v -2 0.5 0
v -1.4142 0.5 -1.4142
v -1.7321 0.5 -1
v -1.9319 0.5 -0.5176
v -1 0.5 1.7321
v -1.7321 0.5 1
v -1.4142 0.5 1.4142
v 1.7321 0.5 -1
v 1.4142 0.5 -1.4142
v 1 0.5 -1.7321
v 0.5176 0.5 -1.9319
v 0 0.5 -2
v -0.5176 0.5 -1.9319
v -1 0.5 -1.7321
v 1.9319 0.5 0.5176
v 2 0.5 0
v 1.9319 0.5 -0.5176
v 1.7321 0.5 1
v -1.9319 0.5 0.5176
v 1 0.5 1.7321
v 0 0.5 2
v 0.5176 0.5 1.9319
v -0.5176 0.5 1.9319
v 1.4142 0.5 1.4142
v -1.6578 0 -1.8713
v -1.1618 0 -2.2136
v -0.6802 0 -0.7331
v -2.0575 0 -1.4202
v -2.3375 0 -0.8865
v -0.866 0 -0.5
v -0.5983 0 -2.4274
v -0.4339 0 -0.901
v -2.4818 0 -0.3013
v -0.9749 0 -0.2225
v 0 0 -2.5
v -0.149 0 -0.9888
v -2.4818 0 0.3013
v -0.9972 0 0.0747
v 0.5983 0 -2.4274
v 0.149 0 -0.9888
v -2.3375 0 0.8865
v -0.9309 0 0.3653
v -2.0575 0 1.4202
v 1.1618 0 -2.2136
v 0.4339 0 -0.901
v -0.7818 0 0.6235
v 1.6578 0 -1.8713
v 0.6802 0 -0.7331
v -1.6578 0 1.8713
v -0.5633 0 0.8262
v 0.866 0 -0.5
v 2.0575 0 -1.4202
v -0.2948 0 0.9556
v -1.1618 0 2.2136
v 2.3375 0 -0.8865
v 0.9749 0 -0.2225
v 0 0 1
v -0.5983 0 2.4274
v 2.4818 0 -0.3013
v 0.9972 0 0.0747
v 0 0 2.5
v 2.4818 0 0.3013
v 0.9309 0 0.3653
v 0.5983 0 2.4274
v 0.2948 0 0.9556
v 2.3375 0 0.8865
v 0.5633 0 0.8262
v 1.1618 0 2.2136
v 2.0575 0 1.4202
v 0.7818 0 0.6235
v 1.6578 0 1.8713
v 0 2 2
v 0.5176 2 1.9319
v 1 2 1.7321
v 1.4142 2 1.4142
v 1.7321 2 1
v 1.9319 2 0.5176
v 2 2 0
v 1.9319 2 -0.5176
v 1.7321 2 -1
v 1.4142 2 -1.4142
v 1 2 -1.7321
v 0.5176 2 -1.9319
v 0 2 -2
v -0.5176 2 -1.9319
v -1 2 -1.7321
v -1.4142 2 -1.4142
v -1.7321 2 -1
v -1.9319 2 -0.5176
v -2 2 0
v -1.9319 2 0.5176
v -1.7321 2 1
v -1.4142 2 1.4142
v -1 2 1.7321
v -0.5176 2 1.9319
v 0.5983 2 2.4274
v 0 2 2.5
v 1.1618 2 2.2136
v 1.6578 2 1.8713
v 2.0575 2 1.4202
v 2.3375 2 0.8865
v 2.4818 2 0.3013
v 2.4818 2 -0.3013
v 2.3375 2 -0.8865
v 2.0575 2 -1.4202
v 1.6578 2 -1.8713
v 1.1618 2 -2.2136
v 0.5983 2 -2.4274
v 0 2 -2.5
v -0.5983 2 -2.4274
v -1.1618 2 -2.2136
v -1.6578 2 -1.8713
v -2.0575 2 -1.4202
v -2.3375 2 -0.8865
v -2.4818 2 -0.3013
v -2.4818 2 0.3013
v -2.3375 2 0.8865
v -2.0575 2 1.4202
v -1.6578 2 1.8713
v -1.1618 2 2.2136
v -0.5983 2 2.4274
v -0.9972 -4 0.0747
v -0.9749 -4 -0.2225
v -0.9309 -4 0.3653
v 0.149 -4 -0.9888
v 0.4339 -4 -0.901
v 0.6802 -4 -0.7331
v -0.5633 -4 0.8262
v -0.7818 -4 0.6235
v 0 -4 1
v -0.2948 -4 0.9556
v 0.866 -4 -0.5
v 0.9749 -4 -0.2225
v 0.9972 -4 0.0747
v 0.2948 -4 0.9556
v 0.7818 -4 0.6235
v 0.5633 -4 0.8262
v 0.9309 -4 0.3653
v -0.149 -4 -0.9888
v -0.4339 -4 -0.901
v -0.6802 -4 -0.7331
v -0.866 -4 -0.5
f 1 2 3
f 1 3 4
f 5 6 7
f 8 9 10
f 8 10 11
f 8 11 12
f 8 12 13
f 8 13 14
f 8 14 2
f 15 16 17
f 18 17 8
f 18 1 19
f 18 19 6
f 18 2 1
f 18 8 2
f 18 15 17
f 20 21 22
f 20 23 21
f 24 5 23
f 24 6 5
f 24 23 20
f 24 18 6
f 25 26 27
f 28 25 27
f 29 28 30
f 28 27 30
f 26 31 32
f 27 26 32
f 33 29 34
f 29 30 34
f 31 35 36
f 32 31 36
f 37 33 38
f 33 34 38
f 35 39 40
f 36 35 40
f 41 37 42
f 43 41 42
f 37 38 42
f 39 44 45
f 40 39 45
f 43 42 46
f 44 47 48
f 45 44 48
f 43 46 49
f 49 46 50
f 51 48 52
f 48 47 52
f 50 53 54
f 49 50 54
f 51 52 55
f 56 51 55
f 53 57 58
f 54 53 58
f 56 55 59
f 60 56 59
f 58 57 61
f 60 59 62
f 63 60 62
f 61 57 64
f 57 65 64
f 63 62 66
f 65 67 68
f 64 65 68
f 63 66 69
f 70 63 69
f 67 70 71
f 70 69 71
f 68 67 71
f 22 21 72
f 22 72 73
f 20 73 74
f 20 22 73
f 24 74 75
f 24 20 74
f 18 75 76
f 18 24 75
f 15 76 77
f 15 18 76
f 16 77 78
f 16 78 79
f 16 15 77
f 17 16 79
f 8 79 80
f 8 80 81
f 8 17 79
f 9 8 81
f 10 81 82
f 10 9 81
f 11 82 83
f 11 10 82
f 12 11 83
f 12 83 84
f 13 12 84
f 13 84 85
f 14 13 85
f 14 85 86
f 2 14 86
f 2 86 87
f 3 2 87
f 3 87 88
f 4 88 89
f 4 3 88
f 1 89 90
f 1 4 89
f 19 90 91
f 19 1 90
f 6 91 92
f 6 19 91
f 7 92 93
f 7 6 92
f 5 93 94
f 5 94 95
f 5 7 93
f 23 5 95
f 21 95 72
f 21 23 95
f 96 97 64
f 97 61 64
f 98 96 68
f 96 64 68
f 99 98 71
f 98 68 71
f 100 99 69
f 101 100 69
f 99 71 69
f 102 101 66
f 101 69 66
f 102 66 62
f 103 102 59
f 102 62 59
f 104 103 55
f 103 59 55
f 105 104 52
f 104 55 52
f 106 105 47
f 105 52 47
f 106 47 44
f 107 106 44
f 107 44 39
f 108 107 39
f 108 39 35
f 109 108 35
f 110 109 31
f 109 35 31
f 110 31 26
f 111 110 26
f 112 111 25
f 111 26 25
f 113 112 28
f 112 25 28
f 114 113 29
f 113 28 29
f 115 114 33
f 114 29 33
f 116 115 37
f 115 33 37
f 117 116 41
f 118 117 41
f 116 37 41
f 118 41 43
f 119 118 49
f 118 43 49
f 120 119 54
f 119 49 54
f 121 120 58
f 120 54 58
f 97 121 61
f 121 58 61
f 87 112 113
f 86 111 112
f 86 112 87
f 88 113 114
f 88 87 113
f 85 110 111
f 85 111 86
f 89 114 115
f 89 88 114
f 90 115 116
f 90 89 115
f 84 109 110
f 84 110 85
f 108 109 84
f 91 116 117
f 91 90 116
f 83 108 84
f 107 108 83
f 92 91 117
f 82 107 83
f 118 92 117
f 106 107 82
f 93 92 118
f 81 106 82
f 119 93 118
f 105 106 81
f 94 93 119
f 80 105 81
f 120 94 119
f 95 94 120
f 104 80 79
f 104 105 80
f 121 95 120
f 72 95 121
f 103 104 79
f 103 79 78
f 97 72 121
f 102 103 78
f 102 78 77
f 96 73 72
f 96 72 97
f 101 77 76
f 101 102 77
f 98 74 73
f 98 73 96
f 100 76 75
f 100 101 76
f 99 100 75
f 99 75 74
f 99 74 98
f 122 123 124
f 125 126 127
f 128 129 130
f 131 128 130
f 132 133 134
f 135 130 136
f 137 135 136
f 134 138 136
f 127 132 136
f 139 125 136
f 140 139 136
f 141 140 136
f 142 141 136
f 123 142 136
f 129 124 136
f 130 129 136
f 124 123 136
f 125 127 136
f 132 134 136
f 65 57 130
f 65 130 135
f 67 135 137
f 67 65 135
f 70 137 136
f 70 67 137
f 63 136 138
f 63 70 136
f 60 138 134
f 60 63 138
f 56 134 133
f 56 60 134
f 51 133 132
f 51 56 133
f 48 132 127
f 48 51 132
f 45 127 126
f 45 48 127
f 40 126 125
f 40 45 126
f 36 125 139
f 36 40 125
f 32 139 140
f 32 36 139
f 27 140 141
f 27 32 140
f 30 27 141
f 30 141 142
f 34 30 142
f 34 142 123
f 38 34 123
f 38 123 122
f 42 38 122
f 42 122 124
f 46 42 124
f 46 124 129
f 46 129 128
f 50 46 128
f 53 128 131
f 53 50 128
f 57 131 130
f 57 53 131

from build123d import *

# Parameters (mm, degrees)
BOTTOMBASES_R     = 1
BOTTOM_BASE_DEPTH = 4
MAINBASES_R       = 2.5
MAIN_BASE_DEPTH   = 0.5
WALLS_R           = 2.5
WALLS_R_2         = 2
WALL_DEPTH        = 1.5


with BuildPart() as part:
    # BottomBaseS → BOTTOM BASE (new body)
    with BuildSketch(Plane(origin=(0, 0, 0), x_dir=(1, 0, 0), z_dir=(0, 1, 0))):
        with Locations(Location((0, 0, 0), (0, 0, 270))):
            Circle(BOTTOMBASES_R)
    extrude(amount=-BOTTOM_BASE_DEPTH)

    # MainBaseS → MAIN BASE (add)
    with BuildSketch(Plane(origin=(0, 0, 0), x_dir=(1, 0, 0), z_dir=(0, 1, 0))):
        with Locations(Location((0, 0, 0), (0, 0, 270))):
            Circle(MAINBASES_R)
    extrude(amount=MAIN_BASE_DEPTH)

    # WallS → WALL (add)
    with BuildSketch(Plane(origin=(0, 0.5, 0), x_dir=(1, 0, 0), z_dir=(0, 1, 0))):
        with Locations(Location((0, 0, 0), (0, 0, 270))):
            Circle(WALLS_R)
        with Locations(Location((0, 0, 0), (0, 0, 270))):
            Circle(WALLS_R_2, mode=Mode.SUBTRACT)
    extrude(amount=WALL_DEPTH)


solid = part.part
